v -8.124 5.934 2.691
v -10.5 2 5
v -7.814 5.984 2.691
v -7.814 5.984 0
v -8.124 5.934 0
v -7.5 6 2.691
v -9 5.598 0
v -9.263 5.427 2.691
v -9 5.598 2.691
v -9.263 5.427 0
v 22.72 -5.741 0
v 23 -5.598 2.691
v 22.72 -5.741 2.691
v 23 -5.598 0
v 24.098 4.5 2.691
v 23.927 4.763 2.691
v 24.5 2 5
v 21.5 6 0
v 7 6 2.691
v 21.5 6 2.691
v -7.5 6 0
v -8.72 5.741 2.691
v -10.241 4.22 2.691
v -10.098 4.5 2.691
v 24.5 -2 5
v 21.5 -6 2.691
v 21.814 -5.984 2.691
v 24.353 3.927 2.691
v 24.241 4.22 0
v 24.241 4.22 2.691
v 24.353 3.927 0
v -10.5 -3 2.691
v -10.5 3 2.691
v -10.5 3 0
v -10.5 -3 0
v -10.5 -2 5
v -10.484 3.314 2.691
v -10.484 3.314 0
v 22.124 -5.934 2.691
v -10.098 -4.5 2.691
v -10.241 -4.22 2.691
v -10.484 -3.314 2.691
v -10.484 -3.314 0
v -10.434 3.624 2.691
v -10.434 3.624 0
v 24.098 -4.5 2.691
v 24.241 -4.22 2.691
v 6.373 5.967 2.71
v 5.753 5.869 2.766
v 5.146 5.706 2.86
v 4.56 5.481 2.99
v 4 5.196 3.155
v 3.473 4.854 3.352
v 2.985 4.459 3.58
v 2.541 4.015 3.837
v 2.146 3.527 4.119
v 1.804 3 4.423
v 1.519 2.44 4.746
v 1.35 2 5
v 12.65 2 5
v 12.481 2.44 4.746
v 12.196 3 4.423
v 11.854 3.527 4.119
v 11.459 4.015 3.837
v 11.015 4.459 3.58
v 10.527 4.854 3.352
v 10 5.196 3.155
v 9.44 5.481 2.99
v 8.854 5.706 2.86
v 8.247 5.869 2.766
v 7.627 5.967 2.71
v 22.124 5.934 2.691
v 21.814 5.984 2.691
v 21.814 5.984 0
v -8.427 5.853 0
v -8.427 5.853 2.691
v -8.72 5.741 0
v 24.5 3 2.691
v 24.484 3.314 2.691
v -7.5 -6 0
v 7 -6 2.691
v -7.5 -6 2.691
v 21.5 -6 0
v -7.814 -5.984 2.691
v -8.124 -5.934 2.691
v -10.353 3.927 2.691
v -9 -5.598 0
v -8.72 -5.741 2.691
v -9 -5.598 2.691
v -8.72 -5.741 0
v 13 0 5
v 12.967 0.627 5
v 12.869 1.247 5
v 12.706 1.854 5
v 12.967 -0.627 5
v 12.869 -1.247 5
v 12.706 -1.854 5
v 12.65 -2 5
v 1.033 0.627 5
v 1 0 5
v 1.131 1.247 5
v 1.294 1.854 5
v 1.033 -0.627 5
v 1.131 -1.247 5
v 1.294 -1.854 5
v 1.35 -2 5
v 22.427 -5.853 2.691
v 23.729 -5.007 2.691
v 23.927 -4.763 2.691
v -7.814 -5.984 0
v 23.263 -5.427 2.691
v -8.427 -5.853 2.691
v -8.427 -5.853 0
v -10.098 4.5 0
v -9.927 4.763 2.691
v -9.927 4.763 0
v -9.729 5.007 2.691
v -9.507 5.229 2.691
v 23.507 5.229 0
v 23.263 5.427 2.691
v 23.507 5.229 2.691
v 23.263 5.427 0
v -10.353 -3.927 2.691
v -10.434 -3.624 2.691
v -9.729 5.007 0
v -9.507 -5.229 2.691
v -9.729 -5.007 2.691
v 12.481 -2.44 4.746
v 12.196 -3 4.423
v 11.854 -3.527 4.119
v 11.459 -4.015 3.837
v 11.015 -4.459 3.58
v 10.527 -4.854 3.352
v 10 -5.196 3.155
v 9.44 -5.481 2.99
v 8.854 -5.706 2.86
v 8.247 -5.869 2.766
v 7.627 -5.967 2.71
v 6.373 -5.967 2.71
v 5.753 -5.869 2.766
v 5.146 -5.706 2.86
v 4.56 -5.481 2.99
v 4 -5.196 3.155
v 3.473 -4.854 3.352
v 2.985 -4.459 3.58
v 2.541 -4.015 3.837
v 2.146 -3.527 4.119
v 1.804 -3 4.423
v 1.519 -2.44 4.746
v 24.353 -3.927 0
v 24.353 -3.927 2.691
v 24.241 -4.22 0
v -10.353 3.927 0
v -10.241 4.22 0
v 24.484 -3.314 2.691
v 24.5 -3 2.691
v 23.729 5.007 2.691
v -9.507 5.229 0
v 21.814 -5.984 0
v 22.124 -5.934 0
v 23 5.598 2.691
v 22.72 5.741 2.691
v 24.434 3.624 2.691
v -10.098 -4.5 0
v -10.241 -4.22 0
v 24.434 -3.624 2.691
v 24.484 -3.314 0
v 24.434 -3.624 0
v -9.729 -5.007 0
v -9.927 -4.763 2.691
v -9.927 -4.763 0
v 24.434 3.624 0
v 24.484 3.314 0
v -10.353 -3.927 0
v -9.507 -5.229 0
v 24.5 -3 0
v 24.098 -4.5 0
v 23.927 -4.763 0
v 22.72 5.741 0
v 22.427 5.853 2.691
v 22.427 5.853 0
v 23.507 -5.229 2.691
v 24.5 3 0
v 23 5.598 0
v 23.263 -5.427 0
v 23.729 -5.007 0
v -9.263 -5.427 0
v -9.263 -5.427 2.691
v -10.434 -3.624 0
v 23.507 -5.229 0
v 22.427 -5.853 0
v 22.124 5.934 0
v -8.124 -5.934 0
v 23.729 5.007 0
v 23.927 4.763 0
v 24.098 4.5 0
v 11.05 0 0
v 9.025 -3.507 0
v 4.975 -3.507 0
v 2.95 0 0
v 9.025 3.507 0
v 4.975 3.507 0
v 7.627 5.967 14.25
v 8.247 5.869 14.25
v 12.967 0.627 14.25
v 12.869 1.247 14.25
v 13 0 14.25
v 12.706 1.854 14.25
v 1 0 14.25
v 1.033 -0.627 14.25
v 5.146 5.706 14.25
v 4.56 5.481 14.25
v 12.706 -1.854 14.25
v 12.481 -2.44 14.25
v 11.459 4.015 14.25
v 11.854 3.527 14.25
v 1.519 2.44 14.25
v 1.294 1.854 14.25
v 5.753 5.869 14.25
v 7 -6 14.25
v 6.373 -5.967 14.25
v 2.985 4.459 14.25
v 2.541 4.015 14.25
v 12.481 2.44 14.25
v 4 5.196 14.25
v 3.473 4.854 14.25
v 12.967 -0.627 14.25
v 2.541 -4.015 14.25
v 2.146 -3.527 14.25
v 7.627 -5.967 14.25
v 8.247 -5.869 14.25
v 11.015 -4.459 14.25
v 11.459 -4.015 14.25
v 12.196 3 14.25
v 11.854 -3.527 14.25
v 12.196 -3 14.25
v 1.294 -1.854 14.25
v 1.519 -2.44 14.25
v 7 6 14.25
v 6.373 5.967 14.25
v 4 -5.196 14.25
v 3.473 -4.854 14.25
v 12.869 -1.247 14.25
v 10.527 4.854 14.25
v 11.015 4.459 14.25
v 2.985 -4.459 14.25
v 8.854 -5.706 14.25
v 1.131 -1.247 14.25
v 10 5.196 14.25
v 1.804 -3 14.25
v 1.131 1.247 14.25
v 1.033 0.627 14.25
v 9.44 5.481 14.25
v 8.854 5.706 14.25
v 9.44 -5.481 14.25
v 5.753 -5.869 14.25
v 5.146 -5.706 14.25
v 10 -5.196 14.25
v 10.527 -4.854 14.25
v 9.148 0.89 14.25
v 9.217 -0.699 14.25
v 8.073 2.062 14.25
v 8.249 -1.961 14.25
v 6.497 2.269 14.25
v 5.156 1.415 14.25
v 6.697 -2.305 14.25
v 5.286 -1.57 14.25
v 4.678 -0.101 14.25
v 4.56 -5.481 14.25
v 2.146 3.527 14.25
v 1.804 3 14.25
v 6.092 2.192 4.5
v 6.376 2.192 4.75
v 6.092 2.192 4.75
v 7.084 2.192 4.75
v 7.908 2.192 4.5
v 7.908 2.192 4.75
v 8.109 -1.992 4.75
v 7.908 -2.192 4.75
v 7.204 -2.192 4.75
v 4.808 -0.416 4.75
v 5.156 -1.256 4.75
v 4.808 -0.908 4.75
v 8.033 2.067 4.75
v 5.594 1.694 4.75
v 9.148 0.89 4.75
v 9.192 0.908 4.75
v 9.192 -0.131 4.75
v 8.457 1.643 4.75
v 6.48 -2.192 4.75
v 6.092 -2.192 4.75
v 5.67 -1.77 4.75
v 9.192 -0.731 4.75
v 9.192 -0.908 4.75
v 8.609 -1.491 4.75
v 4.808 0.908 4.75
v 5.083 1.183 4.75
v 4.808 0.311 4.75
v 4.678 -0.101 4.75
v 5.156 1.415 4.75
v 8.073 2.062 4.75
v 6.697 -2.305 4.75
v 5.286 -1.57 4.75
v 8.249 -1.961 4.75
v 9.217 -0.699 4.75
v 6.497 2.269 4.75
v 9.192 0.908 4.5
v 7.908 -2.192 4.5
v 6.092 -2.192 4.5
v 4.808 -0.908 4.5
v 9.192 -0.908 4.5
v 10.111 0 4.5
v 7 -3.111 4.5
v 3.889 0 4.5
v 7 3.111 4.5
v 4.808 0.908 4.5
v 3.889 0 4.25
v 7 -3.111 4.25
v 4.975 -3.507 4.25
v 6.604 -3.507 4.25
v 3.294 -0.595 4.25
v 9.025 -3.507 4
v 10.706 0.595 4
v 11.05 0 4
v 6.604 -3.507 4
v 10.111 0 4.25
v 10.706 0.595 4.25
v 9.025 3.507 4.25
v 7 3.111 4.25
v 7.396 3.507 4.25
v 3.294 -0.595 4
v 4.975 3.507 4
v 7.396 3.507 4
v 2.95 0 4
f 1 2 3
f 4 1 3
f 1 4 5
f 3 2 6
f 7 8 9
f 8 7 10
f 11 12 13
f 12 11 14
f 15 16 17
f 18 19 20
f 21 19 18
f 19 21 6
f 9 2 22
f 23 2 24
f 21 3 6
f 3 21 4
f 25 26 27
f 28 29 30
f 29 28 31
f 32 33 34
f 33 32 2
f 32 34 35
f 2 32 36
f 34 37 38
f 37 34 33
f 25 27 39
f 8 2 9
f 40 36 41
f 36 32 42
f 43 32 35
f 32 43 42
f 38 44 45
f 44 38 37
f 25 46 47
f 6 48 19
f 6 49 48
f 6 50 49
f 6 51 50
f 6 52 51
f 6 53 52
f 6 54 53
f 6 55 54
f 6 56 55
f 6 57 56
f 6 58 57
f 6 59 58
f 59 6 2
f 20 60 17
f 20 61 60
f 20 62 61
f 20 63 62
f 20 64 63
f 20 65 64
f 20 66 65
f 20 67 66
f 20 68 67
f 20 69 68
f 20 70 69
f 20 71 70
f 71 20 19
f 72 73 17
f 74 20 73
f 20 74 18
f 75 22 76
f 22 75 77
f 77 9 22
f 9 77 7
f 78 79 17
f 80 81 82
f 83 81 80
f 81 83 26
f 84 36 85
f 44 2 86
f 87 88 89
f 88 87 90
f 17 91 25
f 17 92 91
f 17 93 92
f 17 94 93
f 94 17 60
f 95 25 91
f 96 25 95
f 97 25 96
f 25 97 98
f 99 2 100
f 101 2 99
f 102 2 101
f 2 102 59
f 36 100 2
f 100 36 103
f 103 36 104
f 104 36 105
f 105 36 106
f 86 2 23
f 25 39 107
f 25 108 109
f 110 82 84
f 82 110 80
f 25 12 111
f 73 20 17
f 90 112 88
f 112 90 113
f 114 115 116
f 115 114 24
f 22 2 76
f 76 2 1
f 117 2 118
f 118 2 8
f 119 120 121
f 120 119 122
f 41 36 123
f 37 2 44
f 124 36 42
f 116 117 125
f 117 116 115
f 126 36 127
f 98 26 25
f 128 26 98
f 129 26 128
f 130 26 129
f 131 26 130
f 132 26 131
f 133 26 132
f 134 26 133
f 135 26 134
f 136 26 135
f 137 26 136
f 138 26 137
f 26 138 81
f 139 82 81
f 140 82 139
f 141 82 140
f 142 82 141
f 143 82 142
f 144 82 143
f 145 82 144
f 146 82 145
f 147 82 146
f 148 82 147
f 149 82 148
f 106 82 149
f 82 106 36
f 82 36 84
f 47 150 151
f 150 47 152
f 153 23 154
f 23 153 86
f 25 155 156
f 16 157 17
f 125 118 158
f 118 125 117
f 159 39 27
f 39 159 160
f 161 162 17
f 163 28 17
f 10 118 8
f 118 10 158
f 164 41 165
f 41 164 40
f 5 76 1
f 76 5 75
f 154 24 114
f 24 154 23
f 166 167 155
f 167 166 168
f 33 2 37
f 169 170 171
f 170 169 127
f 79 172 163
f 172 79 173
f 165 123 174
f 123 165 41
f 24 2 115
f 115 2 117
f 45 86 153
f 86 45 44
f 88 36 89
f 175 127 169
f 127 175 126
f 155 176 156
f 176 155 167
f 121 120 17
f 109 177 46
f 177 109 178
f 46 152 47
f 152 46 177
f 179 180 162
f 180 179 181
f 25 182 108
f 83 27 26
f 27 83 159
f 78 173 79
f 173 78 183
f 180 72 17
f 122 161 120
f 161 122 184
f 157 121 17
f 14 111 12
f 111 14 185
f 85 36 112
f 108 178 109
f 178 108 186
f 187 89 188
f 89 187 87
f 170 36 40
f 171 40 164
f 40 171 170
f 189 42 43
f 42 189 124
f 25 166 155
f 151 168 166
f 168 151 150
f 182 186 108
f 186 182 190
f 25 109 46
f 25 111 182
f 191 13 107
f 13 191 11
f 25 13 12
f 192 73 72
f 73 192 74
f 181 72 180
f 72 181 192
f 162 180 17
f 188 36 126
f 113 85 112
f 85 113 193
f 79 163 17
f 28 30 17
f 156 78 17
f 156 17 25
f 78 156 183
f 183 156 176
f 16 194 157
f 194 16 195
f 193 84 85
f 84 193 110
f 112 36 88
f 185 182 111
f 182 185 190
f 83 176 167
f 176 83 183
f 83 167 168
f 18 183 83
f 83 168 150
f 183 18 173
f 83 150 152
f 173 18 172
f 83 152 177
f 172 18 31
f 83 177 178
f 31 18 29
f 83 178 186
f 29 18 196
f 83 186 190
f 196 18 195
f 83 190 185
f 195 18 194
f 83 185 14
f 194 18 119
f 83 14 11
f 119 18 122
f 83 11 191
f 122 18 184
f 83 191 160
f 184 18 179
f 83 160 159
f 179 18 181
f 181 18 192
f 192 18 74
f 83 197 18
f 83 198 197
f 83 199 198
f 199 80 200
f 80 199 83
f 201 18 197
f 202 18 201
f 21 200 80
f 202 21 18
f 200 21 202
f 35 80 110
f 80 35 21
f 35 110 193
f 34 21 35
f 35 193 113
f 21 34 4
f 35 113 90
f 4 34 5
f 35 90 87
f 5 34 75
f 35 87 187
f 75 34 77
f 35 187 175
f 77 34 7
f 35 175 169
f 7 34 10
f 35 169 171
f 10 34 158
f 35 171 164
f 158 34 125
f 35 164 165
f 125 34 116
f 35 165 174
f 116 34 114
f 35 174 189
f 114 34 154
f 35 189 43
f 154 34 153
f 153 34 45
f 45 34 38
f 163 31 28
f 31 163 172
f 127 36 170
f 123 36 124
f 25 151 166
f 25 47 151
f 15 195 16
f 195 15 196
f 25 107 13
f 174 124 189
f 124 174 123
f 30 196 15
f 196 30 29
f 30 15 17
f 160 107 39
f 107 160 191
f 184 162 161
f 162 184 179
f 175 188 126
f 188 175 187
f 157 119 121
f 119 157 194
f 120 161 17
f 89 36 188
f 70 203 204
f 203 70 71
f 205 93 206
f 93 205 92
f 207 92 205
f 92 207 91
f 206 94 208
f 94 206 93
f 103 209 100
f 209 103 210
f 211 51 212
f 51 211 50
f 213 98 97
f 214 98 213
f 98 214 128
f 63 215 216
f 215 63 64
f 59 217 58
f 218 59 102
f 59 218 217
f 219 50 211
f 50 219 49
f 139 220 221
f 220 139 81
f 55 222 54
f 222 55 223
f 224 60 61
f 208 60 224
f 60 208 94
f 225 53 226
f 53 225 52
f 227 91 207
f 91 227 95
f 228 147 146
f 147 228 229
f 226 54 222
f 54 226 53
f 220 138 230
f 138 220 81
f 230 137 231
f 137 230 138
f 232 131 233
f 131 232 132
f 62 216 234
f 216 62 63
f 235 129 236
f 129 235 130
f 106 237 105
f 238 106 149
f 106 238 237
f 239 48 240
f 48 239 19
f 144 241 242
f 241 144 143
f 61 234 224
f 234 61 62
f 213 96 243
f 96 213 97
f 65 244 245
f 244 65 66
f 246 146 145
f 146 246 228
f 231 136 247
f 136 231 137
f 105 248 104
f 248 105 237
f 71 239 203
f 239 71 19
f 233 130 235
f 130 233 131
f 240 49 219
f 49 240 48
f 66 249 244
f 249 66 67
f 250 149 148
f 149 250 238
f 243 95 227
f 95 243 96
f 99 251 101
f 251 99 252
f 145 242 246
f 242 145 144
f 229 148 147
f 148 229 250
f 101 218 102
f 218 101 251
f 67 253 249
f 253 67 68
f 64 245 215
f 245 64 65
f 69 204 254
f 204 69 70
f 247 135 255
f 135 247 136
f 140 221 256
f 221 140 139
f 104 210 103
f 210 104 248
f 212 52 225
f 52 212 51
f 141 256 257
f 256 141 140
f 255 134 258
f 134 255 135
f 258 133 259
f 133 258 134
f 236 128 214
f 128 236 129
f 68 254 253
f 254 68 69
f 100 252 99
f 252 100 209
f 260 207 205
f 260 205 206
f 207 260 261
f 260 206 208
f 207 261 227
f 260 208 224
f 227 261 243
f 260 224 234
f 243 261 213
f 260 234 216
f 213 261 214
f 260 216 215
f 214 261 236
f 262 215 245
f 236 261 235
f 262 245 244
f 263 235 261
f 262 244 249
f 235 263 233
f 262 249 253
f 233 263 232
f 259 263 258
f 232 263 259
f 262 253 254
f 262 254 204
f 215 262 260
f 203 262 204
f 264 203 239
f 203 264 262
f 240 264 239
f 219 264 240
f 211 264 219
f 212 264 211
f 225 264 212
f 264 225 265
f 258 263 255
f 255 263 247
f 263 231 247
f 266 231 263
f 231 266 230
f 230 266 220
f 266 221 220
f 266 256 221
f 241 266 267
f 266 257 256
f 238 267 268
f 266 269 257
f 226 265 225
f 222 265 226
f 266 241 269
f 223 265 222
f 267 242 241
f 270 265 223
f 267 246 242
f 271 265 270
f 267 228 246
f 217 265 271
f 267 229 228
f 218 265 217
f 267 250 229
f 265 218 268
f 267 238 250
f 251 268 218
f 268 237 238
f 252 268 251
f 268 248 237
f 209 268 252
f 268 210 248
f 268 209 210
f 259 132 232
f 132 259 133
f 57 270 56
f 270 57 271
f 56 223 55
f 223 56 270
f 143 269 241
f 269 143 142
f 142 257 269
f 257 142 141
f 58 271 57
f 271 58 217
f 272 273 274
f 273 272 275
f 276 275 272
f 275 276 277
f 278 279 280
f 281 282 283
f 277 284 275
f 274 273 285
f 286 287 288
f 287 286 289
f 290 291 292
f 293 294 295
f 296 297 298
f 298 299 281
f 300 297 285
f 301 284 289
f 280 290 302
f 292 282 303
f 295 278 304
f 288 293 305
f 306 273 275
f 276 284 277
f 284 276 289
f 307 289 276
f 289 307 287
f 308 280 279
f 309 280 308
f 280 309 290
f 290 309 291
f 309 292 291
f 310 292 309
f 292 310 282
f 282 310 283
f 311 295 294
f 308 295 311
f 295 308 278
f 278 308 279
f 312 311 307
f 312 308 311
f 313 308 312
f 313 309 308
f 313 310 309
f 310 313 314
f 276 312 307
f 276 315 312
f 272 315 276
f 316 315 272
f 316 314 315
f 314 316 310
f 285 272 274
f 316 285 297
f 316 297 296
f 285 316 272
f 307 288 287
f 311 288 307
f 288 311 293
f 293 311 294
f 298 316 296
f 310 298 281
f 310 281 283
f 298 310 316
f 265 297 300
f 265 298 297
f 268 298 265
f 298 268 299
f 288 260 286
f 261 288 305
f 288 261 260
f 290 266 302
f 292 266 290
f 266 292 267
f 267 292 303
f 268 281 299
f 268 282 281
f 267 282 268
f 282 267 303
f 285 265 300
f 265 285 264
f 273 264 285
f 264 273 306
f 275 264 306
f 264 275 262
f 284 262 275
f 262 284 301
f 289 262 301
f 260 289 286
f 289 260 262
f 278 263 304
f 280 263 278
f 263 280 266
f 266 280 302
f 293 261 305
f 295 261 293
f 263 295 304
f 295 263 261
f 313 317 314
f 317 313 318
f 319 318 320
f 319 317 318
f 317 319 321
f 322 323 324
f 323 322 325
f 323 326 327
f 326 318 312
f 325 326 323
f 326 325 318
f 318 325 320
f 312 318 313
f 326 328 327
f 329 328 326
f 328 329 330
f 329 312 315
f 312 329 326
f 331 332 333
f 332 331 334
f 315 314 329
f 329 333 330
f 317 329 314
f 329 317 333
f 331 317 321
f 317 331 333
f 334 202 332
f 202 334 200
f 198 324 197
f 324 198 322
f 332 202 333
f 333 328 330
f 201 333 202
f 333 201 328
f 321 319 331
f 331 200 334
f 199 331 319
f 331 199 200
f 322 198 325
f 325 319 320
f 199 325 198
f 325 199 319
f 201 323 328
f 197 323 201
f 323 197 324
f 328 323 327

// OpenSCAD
//
// NopSCADlib Copyright Chris Palmer 2018
// nop.head@gmail.com
// hydraraptor.blogspot.com
//
// This file is part of NopSCADlib.
//
// NopSCADlib is free software: you can redistribute it and/or modify it under the terms of the
// GNU General Public License as published by the Free Software Foundation, either version 3 of
// the License, or (at your option) any later version.
//
// NopSCADlib is distributed in the hope that it will be useful, but WITHOUT ANY WARRANTY;
// without even the implied warranty of MERCHANTABILITY or FITNESS FOR A PARTICULAR PURPOSE.
// See the GNU General Public License for more details.
//
// You should have received a copy of the GNU General Public License along with NopSCADlib.
// If not, see <https://www.gnu.org/licenses/>.
//
include <../core.scad>
use <../door_latch.scad>

module door_latches()
     translate([door_latch_offset(), 0])
        if($preview)
            door_latch_assembly(3);
        else
            door_latch_stl();

door_latches();
